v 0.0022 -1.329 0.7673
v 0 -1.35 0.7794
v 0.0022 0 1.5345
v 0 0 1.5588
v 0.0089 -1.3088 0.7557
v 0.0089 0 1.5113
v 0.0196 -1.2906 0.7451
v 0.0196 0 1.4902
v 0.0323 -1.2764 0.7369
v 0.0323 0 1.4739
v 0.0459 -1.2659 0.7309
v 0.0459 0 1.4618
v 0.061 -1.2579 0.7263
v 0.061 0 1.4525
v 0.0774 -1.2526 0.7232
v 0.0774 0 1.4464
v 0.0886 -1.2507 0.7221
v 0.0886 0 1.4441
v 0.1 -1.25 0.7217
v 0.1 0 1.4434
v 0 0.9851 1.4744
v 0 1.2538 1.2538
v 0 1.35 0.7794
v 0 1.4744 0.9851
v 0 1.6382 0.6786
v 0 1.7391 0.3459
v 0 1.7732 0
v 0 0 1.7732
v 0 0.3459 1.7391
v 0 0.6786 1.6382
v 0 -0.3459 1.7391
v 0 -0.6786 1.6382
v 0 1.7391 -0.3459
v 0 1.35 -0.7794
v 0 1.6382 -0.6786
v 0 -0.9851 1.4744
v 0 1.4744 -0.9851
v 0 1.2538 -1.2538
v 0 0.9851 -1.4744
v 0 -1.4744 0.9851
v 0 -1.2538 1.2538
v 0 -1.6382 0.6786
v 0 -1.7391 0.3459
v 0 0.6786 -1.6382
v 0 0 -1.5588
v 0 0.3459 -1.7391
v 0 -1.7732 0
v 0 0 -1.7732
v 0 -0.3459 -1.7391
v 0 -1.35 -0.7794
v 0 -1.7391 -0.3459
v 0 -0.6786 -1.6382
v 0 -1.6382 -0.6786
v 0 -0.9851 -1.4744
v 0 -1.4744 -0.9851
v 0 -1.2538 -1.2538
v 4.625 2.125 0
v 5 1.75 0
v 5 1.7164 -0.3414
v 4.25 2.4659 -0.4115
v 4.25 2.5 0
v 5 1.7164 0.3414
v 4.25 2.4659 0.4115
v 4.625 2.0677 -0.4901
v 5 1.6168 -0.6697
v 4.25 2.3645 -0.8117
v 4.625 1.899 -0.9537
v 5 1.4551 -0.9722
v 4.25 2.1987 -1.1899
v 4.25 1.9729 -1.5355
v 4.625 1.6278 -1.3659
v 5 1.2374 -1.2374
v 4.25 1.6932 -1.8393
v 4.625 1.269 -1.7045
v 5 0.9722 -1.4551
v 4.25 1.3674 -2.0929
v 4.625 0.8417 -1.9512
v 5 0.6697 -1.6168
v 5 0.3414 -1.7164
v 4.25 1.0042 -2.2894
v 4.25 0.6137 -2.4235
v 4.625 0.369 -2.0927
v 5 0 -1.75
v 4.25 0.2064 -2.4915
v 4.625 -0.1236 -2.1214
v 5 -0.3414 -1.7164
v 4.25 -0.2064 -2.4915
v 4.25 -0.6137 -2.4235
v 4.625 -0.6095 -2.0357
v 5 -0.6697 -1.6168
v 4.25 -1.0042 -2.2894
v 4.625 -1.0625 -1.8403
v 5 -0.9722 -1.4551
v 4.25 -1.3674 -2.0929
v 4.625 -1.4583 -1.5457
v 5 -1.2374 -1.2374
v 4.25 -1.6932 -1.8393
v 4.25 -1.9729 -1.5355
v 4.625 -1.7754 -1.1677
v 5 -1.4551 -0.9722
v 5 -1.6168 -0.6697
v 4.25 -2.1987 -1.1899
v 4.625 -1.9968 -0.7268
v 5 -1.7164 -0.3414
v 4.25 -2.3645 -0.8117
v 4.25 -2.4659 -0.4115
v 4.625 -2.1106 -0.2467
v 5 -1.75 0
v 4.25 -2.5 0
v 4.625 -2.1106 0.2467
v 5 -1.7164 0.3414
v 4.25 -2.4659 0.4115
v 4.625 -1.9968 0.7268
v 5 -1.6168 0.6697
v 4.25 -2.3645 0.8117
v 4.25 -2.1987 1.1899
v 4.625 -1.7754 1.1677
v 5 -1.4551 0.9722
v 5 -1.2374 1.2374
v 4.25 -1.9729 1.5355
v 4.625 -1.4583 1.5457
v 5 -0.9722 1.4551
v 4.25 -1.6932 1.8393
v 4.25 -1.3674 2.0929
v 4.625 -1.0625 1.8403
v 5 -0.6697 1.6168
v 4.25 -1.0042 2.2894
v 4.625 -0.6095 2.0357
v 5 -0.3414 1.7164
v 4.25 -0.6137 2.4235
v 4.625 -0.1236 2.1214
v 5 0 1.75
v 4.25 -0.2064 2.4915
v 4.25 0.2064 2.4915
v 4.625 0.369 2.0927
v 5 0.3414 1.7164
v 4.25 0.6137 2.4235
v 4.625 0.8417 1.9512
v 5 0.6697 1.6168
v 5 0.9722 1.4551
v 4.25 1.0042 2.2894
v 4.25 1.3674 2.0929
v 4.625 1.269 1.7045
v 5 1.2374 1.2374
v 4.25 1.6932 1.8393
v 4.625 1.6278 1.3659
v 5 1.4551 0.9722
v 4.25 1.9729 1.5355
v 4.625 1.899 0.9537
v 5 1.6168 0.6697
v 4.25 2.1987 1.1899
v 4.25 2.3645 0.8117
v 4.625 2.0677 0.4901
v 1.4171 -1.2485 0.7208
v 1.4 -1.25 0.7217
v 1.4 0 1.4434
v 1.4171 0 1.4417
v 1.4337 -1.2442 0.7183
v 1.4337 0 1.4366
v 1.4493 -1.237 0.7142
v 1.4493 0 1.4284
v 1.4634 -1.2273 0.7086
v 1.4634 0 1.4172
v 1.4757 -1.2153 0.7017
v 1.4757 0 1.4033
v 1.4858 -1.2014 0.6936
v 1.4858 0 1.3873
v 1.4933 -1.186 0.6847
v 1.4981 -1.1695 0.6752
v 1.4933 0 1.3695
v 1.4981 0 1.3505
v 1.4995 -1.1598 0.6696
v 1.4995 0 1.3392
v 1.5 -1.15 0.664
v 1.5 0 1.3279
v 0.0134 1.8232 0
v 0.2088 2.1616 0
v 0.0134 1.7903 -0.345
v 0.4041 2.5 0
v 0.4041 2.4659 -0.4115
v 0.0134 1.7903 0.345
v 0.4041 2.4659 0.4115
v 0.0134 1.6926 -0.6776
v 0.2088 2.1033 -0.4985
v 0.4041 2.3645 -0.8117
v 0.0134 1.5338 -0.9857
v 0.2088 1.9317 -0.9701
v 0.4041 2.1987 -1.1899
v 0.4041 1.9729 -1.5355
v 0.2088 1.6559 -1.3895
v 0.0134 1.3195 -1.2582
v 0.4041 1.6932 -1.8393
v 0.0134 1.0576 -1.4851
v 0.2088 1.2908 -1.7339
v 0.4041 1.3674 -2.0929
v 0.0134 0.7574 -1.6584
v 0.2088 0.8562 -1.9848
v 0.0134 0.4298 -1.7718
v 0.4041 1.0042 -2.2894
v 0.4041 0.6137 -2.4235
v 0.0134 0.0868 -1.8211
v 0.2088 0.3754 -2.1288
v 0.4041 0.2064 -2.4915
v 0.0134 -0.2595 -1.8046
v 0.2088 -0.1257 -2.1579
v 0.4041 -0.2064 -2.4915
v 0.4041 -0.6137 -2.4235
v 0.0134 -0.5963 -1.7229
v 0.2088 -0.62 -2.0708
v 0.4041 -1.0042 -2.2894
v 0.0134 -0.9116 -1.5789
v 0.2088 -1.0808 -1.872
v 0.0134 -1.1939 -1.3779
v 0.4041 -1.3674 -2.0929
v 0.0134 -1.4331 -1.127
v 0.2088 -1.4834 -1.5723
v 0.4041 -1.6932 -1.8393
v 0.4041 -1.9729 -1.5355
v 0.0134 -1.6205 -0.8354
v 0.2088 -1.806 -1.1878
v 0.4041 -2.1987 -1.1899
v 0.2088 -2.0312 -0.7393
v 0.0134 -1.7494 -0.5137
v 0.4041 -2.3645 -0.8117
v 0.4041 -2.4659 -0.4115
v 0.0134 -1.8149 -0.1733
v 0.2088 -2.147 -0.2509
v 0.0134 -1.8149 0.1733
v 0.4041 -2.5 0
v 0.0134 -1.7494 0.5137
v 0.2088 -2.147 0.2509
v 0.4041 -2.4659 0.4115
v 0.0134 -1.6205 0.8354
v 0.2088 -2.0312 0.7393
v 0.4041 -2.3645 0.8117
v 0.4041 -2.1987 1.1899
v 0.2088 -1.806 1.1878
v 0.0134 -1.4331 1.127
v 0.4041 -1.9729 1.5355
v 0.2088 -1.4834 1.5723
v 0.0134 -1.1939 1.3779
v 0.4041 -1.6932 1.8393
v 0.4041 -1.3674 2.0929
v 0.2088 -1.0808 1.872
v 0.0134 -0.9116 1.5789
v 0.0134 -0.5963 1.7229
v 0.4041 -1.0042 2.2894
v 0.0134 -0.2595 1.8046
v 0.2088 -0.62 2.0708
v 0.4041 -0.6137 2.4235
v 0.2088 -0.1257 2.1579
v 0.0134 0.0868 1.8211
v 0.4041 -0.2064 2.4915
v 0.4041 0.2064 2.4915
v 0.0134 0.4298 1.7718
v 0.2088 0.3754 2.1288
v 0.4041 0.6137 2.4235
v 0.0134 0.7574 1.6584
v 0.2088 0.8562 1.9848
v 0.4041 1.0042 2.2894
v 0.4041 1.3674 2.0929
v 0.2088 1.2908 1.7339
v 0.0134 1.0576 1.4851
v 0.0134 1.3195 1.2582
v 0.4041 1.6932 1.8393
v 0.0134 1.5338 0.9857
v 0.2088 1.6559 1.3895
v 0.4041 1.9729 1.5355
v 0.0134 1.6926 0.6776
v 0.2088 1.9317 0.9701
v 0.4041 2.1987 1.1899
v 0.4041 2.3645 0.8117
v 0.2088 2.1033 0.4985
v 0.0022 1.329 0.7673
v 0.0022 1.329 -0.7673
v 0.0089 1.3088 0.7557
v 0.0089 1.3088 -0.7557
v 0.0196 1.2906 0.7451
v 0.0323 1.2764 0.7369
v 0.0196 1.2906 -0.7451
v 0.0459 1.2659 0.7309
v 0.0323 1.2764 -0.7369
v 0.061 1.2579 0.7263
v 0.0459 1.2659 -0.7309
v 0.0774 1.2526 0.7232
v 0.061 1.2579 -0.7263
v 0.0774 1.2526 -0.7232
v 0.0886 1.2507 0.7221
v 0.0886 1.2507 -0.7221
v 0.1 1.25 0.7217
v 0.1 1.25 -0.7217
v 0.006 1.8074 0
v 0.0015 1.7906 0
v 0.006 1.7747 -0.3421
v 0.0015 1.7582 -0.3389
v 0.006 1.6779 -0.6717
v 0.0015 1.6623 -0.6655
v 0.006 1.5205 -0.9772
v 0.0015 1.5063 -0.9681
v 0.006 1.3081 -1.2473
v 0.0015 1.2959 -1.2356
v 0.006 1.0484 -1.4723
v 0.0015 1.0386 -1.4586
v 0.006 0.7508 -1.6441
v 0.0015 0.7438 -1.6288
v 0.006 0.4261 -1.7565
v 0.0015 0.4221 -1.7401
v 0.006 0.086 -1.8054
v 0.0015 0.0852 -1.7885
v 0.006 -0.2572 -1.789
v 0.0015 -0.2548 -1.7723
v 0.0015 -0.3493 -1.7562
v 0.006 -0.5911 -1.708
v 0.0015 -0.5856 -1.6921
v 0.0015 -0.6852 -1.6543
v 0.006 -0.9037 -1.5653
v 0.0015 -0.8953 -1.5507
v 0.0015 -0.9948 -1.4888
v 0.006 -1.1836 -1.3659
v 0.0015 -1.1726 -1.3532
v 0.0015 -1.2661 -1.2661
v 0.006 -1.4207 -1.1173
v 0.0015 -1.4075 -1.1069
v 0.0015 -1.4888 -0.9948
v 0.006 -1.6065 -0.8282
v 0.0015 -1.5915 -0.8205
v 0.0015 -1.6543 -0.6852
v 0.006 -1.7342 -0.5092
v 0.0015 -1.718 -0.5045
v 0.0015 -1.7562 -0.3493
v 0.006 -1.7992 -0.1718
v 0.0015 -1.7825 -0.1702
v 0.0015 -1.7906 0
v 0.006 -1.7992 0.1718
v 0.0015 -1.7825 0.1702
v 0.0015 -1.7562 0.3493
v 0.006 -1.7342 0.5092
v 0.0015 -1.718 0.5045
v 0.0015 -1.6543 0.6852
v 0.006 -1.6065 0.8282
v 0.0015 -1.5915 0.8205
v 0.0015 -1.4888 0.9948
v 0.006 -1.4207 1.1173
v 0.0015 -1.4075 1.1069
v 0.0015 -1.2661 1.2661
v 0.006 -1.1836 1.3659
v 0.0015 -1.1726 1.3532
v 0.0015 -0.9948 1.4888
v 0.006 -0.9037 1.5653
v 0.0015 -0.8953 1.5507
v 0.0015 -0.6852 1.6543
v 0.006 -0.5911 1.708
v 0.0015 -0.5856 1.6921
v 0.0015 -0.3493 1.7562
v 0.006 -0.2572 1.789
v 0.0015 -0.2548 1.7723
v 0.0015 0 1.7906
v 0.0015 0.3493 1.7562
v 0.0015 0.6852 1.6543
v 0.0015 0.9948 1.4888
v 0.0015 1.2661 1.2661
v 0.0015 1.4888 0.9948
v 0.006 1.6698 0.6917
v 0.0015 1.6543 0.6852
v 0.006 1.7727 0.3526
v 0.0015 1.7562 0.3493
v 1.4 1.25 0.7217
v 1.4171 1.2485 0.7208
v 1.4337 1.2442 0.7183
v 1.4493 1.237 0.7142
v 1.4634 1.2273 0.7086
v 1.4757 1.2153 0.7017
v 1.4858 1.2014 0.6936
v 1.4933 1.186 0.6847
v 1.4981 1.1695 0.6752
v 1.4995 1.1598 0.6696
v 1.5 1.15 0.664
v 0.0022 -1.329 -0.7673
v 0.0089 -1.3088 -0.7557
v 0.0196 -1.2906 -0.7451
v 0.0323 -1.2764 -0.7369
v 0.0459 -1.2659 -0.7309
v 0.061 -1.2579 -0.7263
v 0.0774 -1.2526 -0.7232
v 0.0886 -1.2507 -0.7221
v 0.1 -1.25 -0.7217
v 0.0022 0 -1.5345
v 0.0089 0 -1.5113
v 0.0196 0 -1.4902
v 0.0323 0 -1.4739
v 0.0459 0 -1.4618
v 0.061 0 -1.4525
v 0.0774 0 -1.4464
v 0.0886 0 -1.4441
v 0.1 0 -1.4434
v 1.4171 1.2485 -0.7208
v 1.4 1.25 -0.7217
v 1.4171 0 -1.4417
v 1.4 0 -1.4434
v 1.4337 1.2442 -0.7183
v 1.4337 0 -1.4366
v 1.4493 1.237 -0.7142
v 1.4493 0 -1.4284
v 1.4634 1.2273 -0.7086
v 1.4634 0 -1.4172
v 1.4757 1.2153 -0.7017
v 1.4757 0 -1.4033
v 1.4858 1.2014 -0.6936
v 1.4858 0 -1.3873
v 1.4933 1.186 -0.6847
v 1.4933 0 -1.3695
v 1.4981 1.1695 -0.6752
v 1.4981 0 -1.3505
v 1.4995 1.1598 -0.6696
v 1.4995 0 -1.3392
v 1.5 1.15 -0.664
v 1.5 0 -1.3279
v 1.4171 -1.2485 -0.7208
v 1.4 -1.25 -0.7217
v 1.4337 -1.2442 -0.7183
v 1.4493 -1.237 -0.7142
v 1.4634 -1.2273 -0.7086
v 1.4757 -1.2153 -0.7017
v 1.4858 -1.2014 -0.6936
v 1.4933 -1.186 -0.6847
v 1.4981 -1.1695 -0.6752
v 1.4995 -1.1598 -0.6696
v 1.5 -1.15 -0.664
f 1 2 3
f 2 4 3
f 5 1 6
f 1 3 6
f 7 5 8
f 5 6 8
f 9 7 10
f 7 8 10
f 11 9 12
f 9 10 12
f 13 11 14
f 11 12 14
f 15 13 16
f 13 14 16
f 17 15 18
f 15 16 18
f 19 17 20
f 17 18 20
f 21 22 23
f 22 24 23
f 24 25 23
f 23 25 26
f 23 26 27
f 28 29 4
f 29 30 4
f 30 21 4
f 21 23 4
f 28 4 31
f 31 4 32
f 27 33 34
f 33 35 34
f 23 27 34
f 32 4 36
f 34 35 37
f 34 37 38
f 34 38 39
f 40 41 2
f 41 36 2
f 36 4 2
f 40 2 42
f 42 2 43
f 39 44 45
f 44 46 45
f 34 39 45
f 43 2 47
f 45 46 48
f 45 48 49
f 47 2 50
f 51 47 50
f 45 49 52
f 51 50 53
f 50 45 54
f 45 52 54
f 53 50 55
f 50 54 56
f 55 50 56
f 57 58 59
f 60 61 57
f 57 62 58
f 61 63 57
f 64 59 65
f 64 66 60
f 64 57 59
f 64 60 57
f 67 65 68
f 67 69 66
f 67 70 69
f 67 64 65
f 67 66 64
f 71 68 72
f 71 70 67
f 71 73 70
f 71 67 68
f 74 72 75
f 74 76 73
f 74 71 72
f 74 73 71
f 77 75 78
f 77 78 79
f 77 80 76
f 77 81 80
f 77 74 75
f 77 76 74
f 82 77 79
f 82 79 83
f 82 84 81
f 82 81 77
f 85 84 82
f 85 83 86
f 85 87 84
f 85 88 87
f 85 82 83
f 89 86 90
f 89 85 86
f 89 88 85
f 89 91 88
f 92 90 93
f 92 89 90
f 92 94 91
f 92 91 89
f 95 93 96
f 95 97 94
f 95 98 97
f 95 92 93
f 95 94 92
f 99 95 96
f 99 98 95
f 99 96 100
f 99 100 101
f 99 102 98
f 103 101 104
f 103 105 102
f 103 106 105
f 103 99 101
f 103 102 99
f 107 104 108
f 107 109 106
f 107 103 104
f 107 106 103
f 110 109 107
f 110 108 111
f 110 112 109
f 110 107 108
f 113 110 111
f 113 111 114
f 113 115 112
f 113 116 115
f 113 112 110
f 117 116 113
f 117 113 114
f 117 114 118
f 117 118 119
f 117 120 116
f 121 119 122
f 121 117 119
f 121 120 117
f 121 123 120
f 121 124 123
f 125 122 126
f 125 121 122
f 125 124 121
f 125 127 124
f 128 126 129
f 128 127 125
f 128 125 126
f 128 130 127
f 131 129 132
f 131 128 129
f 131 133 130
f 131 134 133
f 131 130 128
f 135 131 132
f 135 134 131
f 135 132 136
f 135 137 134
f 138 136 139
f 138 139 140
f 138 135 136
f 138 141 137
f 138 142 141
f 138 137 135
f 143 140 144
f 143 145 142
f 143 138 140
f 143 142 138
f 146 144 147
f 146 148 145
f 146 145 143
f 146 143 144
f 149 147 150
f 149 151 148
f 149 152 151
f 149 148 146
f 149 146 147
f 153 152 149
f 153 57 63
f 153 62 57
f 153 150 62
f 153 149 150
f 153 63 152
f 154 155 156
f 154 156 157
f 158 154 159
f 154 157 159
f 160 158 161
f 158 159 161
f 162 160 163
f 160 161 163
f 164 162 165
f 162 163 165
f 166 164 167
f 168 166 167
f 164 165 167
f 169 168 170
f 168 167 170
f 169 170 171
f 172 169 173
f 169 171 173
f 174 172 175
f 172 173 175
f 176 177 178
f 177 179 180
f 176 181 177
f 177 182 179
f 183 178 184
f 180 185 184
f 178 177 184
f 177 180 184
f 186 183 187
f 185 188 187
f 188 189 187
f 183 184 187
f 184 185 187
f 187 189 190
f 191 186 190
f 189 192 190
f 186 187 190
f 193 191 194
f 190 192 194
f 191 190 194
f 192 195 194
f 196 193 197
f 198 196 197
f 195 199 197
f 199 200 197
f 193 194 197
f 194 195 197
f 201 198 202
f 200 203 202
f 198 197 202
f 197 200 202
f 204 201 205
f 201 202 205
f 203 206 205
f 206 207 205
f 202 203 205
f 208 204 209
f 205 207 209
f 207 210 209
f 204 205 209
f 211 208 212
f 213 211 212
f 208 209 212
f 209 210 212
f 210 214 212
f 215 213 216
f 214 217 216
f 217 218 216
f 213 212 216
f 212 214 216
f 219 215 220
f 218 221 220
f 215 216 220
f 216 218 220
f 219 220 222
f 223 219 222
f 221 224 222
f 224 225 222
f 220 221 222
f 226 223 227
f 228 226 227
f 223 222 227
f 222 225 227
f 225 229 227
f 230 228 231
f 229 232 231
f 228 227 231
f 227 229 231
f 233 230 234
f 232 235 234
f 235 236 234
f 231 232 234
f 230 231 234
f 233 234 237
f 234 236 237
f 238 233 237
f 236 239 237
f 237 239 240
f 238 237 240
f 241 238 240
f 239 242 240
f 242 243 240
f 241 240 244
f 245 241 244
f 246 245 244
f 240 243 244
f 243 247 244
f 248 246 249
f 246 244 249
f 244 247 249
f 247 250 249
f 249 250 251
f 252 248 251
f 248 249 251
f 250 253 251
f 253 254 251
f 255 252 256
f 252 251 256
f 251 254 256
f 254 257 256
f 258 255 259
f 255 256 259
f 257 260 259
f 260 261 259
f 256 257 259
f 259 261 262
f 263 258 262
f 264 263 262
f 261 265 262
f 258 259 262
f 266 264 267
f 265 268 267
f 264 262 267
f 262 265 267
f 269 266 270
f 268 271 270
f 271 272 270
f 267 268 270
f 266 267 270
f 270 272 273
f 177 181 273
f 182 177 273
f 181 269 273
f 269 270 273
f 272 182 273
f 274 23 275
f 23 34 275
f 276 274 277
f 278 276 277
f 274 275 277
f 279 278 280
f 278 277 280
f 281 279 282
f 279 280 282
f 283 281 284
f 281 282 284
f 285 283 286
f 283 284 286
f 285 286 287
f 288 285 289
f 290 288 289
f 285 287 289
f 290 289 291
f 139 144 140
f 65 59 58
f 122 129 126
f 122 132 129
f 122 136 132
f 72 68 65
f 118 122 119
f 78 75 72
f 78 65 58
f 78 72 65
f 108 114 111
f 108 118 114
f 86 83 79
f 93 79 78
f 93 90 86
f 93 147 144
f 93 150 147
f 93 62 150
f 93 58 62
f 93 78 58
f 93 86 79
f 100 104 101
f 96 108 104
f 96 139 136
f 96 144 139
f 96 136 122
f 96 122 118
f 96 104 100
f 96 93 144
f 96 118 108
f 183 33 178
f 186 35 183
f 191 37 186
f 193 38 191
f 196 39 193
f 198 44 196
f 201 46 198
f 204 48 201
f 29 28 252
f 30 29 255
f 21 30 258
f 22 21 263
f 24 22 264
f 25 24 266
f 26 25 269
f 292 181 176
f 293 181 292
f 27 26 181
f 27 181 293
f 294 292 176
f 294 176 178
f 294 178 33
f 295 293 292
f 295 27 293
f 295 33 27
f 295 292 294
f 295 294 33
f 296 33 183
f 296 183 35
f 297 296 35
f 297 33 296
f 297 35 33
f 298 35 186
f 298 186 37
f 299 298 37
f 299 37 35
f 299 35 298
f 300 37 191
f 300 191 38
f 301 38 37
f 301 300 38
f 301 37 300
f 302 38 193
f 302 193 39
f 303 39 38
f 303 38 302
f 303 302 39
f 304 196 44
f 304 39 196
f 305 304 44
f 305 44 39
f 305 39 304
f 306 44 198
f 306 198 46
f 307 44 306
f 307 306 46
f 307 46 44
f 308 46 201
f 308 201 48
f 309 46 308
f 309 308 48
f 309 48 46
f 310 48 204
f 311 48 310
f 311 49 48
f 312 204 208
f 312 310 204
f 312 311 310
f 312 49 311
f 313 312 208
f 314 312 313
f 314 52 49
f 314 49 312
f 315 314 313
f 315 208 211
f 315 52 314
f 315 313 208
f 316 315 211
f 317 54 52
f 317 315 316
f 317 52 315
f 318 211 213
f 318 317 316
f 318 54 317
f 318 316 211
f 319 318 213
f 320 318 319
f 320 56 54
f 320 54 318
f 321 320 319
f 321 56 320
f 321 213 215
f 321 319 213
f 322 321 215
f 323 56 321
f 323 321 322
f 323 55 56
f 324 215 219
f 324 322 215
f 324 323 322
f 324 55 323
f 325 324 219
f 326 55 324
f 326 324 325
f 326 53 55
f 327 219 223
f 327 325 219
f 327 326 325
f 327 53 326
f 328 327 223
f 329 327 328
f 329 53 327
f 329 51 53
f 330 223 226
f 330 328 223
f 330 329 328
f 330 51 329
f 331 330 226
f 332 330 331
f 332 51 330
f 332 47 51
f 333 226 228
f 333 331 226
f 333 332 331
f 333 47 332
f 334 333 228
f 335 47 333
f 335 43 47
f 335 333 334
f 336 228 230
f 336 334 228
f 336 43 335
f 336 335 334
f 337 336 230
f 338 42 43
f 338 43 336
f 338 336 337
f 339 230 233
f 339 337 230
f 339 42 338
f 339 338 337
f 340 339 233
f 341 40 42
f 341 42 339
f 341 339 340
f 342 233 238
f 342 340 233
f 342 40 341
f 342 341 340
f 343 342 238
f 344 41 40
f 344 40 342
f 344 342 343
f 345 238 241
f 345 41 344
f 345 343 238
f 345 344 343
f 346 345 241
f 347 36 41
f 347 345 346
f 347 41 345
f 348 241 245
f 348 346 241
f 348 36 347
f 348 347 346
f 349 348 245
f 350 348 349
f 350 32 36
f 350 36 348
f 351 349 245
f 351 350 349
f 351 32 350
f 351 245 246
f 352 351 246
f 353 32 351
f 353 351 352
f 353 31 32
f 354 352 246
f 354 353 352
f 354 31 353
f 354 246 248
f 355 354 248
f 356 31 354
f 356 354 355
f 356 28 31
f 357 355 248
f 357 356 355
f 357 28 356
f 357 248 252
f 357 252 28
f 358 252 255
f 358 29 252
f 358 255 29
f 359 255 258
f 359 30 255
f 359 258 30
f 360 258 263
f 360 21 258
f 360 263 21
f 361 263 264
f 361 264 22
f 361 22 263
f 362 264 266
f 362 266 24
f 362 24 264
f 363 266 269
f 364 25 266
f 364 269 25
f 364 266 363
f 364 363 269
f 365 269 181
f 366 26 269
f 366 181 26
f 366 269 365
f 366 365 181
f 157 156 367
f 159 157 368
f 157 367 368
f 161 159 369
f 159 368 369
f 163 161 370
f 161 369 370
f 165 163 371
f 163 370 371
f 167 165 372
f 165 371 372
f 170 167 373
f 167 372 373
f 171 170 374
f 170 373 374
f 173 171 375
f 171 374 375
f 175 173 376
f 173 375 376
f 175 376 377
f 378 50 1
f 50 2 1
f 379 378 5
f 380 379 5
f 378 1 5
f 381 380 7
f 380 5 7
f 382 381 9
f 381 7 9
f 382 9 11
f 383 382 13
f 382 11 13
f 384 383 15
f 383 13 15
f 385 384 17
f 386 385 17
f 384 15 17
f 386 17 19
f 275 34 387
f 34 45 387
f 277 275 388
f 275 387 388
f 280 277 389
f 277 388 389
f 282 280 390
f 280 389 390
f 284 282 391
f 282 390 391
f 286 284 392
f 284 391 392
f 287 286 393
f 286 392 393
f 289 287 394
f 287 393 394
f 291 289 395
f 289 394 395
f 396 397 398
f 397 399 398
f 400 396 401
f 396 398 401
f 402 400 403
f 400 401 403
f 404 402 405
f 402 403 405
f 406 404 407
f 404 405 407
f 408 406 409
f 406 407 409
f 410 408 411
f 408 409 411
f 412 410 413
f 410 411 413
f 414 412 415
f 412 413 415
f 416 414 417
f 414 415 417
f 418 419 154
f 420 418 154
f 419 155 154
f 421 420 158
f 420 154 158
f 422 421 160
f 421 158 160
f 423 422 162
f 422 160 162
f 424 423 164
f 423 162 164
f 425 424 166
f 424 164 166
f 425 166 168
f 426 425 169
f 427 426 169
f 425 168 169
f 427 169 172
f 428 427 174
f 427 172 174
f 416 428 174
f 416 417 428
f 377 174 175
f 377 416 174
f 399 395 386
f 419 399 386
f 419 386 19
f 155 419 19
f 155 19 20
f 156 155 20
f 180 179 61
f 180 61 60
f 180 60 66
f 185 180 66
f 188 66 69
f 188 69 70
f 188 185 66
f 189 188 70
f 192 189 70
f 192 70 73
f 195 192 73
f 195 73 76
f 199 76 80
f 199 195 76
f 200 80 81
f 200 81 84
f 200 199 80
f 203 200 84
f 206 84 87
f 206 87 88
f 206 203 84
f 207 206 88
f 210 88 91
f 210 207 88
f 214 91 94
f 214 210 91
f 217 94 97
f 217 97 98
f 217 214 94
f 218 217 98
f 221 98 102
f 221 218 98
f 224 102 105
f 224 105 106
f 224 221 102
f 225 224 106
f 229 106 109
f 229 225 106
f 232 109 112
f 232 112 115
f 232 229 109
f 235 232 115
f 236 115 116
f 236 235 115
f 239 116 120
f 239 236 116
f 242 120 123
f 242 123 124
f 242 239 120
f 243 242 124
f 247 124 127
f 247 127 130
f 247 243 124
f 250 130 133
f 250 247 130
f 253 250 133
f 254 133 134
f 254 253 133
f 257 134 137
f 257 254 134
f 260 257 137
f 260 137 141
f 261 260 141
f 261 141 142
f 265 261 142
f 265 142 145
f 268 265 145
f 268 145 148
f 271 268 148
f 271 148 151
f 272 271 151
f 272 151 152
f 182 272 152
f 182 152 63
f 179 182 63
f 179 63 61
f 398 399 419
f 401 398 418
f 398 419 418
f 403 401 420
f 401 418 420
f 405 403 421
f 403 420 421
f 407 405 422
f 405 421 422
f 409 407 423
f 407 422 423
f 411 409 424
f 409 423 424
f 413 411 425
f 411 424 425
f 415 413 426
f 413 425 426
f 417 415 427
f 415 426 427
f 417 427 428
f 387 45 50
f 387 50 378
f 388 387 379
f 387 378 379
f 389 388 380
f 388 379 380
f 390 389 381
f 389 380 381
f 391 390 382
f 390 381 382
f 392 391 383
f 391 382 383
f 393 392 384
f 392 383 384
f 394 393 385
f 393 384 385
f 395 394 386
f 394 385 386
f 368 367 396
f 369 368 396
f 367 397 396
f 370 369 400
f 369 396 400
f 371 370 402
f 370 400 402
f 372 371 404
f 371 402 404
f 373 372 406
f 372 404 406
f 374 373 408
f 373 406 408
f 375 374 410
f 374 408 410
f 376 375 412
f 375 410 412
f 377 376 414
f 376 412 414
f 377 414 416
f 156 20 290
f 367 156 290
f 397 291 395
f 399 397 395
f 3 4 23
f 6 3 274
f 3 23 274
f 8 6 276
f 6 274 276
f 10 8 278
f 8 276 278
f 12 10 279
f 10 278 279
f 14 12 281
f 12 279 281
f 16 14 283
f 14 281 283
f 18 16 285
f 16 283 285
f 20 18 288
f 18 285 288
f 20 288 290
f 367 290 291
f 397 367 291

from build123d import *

# Parameters (mm, degrees)
SKETCH_1_W          = 5
SKETCH_1_H          = 2.5
CUT_EXTRUDE_1_DEPTH = 1.5
CHAMFER_1_SIZE      = 0.75
CHAMFER_2_SIZE      = 0.7
CHAMFER_2_SIZE2     = 0.404145188
FILLET_1_R          = 0.1


with BuildPart() as part:
    # Эскиз1 → Повернуть1 (revolve)
    with BuildSketch(Plane(origin=(0, 0, 0), x_dir=(-1, 0, 0), z_dir=(0, 0, -1))):
        with Locations((-2.5, 1.25)):
            Rectangle(SKETCH_1_W, SKETCH_1_H)
    revolve(axis=Axis((5, 0, 0), (-1, 0, 0)))

    # Эскиз2 → Вырез-Вытянуть1 (cut)
    with BuildSketch(Plane.ZY):
        Polygon((0.721687836, -1.25), (1.443375673, 0), (0.721687836, 1.25), (-0.721687836, 1.25), (-1.443375673, 0), (-0.721687836, -1.25), align=None)
    extrude(amount=-CUT_EXTRUDE_1_DEPTH, mode=Mode.SUBTRACT)

    # Фаска1
    chamfer_1_edges = [part.edges().sort_by_distance(p)[0] for p in [
        (5, -2.5, 0),
    ]]
    chamfer(chamfer_1_edges, length=CHAMFER_1_SIZE)

    # Фаска2
    chamfer_2_edges = [part.edges().sort_by_distance(p)[0] for p in [
        (0, -2.5, 0),
    ]]
    chamfer_2_side = [part.faces().sort_by_distance(p)[0] for p in [
        (0, -2.429289322, 0),
    ]]
    chamfer(chamfer_2_edges, length=CHAMFER_2_SIZE, length2=CHAMFER_2_SIZE2, reference=chamfer_2_side[0])

    # Скругление1
    fillet_1_edges = [part.edges().sort_by_distance(p)[0] for p in [
        (1.5, -1.25, 0),
        (1.5, -0.625, -1.082531755),
        (1.5, 0.625, -1.082531755),
        (1.5, 1.25, 0),
        (1.5, 0.625, 1.082531755),
        (1.5, -0.625, 1.082531755),
        (0, -1.25, 0),
        (0, -0.625, 1.082531755),
        (0, 0.625, 1.082531755),
        (0, 1.25, 0),
        (0, 0.625, -1.082531755),
        (0, -0.625, -1.082531755),
        (0, -1.8, 0),
    ]]
    fillet(fillet_1_edges, radius=FILLET_1_R)


solid = part.part
